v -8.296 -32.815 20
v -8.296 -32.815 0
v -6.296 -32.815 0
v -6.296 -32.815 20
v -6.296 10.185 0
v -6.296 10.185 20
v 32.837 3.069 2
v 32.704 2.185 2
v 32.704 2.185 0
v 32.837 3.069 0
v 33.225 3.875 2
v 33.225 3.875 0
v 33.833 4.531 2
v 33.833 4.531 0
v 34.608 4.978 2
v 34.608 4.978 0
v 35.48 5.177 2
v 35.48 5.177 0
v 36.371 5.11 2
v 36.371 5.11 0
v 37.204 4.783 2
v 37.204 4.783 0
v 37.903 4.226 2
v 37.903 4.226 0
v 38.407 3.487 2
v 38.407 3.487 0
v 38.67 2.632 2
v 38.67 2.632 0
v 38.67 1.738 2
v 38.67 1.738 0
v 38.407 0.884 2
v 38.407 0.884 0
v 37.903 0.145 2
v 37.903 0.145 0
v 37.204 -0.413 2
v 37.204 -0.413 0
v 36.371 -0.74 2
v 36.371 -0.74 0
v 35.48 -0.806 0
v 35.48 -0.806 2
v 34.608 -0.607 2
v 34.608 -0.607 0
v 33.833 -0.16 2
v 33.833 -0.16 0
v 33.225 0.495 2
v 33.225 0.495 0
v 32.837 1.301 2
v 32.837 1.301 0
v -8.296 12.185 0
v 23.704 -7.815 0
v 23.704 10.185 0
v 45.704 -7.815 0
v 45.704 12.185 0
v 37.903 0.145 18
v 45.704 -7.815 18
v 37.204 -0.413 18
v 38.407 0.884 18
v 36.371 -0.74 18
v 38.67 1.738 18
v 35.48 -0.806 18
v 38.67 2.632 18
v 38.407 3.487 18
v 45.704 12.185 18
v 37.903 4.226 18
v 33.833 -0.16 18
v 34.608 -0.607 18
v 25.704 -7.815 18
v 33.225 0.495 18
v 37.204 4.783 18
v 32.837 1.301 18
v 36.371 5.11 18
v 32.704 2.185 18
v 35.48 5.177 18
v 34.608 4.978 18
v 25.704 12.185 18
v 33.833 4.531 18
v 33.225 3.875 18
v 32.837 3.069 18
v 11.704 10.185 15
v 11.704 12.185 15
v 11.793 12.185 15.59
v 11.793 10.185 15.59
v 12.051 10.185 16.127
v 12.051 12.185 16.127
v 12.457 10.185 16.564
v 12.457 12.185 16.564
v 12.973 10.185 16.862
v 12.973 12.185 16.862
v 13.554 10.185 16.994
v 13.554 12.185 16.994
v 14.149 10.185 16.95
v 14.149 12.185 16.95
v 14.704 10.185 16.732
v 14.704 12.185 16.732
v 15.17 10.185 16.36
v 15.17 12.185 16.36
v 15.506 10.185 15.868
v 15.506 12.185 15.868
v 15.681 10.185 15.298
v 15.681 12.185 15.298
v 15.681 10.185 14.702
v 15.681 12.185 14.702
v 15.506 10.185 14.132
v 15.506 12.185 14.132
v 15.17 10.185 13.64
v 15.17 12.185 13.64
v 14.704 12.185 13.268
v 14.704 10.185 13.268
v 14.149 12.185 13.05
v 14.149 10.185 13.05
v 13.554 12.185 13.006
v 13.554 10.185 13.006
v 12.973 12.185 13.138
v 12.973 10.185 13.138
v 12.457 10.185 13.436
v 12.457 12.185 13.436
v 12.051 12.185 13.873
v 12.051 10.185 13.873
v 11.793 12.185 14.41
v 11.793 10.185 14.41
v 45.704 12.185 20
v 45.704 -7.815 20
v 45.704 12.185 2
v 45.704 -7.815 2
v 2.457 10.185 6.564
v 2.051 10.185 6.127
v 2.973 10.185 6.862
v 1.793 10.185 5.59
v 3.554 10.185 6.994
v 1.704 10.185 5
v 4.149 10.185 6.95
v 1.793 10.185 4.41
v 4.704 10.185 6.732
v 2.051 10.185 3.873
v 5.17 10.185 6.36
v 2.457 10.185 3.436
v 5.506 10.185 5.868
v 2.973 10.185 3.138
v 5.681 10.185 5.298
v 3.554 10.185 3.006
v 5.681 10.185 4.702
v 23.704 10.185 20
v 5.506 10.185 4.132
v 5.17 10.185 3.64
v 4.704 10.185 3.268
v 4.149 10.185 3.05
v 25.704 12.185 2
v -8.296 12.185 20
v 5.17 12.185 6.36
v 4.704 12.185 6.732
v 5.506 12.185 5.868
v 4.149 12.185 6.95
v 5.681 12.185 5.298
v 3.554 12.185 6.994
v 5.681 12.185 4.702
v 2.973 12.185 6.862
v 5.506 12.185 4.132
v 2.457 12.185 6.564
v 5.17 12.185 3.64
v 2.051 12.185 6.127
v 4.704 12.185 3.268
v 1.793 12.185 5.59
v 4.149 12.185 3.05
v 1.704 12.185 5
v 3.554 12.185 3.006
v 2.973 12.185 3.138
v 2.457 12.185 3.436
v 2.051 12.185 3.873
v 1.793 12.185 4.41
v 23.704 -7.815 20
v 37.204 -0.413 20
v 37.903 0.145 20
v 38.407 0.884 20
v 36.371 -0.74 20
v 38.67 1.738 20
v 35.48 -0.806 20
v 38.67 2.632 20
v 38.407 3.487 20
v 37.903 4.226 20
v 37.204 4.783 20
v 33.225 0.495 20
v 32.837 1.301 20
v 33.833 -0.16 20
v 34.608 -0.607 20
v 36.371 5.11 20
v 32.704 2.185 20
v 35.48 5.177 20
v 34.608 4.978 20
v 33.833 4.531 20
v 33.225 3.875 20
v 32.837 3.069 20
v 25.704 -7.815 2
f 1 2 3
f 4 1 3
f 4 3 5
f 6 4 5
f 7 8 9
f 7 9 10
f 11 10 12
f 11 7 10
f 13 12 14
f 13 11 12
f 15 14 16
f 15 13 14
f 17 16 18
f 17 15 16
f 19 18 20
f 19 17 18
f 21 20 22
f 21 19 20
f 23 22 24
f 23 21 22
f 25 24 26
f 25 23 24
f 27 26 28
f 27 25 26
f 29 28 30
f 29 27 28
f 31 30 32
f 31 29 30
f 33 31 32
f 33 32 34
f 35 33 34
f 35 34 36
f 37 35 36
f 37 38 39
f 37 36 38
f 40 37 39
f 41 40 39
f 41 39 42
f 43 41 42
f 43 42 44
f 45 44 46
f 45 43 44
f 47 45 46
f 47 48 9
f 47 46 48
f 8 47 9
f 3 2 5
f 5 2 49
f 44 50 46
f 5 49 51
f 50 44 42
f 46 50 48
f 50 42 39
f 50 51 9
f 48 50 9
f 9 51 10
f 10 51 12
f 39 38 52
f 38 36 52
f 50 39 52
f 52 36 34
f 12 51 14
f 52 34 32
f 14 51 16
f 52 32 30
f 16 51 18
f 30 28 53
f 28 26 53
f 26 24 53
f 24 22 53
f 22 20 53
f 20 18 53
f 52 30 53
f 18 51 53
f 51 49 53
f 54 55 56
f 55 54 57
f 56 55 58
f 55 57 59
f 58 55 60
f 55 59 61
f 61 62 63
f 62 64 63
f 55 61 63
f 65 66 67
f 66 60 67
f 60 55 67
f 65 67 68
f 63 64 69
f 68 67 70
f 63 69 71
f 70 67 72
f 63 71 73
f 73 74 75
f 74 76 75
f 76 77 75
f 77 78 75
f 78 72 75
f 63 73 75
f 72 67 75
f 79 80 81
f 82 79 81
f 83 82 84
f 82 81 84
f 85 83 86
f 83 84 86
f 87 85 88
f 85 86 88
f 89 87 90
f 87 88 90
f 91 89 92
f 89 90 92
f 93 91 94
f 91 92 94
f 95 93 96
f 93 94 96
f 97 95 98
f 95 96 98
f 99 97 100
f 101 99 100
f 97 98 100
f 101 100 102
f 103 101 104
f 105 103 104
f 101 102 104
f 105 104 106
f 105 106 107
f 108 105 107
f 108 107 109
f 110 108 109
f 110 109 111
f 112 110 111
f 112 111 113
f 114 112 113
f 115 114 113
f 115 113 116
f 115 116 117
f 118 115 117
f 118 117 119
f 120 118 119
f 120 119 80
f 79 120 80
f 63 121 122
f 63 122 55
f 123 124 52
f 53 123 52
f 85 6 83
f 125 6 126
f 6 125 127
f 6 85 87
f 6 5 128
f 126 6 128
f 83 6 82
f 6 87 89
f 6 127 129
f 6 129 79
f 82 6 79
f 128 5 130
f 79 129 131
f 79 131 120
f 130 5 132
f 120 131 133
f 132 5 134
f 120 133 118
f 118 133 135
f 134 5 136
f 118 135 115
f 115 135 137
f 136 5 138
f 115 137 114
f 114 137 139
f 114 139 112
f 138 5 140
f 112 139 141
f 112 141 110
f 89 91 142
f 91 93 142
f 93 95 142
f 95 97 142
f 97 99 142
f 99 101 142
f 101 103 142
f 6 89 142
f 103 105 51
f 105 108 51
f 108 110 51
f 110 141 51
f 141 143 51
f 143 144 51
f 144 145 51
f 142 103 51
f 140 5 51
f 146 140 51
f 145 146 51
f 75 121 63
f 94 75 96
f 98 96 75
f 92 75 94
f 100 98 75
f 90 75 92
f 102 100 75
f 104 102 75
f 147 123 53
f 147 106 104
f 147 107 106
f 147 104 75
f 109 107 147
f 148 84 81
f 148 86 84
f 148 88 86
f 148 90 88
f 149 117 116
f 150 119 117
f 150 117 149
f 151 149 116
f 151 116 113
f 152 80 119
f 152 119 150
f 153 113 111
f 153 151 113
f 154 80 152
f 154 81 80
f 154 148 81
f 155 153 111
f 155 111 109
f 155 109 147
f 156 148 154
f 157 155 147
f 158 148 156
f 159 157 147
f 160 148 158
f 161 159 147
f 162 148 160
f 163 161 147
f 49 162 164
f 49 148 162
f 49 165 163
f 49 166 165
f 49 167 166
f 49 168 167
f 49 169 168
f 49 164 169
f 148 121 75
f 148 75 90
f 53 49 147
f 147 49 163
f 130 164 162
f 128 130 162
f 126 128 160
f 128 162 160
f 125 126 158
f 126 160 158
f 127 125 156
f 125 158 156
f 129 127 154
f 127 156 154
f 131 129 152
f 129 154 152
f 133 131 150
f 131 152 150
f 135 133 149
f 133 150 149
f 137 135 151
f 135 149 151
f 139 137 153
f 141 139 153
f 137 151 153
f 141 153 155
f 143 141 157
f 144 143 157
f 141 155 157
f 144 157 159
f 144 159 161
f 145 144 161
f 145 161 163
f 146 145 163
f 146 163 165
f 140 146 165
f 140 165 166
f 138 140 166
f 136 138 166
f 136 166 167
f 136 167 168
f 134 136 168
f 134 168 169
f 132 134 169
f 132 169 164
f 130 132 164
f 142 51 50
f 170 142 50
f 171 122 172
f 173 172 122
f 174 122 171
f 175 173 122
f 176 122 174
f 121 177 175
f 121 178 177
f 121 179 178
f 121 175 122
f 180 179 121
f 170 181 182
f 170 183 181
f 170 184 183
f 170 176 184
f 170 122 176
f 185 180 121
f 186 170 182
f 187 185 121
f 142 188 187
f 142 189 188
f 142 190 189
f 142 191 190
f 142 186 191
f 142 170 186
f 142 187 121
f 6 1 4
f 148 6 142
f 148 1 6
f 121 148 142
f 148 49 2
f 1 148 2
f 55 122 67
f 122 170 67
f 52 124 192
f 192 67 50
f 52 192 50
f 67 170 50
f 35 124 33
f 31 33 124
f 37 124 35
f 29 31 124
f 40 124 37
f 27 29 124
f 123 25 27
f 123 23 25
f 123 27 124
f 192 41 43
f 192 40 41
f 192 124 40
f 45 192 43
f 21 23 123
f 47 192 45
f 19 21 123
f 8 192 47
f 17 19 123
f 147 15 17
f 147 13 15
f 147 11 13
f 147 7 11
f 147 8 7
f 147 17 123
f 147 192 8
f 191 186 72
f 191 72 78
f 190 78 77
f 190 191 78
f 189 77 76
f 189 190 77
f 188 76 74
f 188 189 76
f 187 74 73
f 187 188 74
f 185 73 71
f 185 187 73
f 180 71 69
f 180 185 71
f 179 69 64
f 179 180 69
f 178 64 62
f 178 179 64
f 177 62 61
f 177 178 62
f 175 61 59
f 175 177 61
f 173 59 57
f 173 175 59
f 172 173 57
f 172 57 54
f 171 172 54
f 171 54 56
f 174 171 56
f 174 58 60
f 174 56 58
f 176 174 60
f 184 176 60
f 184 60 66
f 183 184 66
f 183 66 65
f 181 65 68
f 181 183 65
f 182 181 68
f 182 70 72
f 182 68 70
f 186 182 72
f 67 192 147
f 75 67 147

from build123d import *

# Parameters (mm, degrees)
BOSS_EXTRUDE1_DEPTH     = 20
SKETCH2_R               = 2
CUT_EXTRUDE1_DEPTH      = 20
SKETCH3_W               = 2
SKETCH3_H               = 20
BOSS_EXTRUDE2_DEPTH     = 20
CUT_EXTRUDE2_DEPTH      = 60.712985217
CUT_EXTRUDE2_DEPTH_BACK = 60.712985217
SKETCH4_R               = 3


with BuildPart() as part:
    # Sketch1 → Boss-Extrude1 (new body)
    with BuildSketch(Plane.XY):
        Polygon((-8.296296296, 12.185185185), (-8.296296296, -32.814814815), (-6.296296296, -32.814814815), (-6.296296296, 10.185185185), (23.703703704, 10.185185185), (23.703703704, -7.814814815), (25.703703704, -7.814814815), (25.703703704, 12.185185185), align=None)
    extrude(amount=BOSS_EXTRUDE1_DEPTH)

    # Sketch2 → Cut-Extrude1 (cut)
    with BuildSketch(Plane(origin=(0, 12.185185185, 0), x_dir=(1, 0, 0), z_dir=(0, 1, 0))):
        with Locations(Location((13.703703704, -15, 0), (0, 0, 180))):
            Circle(SKETCH2_R)
        with Locations(Location((3.703703704, -5, 0), (0, 0, 180))):
            Circle(SKETCH2_R)
    extrude(amount=-CUT_EXTRUDE1_DEPTH, mode=Mode.SUBTRACT)

    # Sketch3 → Boss-Extrude2 (add)
    with BuildSketch(Plane(origin=(25.703703704, 0, 0), x_dir=(0, 0, -1), z_dir=(1, 0, 0))):
        with Locations((-19, 2.185185185)):
            Rectangle(SKETCH3_W, SKETCH3_H)
        with Locations((-1, 2.185185185)):
            Rectangle(SKETCH3_W, SKETCH3_H)
    extrude(amount=BOSS_EXTRUDE2_DEPTH)

    # Sketch4 → Cut-Extrude2 (cut, two sides: drawn at the far end of the back side and taken through both)
    with BuildSketch(Plane(origin=(0, 0, 0), x_dir=(-1, 0, 0), z_dir=(0, 0, -1)).offset(-CUT_EXTRUDE2_DEPTH_BACK)):
        with Locations((-35.703703704, 2.185185185)):
            Circle(SKETCH4_R)
    extrude(amount=CUT_EXTRUDE2_DEPTH + CUT_EXTRUDE2_DEPTH_BACK, mode=Mode.SUBTRACT)


solid = part.part
